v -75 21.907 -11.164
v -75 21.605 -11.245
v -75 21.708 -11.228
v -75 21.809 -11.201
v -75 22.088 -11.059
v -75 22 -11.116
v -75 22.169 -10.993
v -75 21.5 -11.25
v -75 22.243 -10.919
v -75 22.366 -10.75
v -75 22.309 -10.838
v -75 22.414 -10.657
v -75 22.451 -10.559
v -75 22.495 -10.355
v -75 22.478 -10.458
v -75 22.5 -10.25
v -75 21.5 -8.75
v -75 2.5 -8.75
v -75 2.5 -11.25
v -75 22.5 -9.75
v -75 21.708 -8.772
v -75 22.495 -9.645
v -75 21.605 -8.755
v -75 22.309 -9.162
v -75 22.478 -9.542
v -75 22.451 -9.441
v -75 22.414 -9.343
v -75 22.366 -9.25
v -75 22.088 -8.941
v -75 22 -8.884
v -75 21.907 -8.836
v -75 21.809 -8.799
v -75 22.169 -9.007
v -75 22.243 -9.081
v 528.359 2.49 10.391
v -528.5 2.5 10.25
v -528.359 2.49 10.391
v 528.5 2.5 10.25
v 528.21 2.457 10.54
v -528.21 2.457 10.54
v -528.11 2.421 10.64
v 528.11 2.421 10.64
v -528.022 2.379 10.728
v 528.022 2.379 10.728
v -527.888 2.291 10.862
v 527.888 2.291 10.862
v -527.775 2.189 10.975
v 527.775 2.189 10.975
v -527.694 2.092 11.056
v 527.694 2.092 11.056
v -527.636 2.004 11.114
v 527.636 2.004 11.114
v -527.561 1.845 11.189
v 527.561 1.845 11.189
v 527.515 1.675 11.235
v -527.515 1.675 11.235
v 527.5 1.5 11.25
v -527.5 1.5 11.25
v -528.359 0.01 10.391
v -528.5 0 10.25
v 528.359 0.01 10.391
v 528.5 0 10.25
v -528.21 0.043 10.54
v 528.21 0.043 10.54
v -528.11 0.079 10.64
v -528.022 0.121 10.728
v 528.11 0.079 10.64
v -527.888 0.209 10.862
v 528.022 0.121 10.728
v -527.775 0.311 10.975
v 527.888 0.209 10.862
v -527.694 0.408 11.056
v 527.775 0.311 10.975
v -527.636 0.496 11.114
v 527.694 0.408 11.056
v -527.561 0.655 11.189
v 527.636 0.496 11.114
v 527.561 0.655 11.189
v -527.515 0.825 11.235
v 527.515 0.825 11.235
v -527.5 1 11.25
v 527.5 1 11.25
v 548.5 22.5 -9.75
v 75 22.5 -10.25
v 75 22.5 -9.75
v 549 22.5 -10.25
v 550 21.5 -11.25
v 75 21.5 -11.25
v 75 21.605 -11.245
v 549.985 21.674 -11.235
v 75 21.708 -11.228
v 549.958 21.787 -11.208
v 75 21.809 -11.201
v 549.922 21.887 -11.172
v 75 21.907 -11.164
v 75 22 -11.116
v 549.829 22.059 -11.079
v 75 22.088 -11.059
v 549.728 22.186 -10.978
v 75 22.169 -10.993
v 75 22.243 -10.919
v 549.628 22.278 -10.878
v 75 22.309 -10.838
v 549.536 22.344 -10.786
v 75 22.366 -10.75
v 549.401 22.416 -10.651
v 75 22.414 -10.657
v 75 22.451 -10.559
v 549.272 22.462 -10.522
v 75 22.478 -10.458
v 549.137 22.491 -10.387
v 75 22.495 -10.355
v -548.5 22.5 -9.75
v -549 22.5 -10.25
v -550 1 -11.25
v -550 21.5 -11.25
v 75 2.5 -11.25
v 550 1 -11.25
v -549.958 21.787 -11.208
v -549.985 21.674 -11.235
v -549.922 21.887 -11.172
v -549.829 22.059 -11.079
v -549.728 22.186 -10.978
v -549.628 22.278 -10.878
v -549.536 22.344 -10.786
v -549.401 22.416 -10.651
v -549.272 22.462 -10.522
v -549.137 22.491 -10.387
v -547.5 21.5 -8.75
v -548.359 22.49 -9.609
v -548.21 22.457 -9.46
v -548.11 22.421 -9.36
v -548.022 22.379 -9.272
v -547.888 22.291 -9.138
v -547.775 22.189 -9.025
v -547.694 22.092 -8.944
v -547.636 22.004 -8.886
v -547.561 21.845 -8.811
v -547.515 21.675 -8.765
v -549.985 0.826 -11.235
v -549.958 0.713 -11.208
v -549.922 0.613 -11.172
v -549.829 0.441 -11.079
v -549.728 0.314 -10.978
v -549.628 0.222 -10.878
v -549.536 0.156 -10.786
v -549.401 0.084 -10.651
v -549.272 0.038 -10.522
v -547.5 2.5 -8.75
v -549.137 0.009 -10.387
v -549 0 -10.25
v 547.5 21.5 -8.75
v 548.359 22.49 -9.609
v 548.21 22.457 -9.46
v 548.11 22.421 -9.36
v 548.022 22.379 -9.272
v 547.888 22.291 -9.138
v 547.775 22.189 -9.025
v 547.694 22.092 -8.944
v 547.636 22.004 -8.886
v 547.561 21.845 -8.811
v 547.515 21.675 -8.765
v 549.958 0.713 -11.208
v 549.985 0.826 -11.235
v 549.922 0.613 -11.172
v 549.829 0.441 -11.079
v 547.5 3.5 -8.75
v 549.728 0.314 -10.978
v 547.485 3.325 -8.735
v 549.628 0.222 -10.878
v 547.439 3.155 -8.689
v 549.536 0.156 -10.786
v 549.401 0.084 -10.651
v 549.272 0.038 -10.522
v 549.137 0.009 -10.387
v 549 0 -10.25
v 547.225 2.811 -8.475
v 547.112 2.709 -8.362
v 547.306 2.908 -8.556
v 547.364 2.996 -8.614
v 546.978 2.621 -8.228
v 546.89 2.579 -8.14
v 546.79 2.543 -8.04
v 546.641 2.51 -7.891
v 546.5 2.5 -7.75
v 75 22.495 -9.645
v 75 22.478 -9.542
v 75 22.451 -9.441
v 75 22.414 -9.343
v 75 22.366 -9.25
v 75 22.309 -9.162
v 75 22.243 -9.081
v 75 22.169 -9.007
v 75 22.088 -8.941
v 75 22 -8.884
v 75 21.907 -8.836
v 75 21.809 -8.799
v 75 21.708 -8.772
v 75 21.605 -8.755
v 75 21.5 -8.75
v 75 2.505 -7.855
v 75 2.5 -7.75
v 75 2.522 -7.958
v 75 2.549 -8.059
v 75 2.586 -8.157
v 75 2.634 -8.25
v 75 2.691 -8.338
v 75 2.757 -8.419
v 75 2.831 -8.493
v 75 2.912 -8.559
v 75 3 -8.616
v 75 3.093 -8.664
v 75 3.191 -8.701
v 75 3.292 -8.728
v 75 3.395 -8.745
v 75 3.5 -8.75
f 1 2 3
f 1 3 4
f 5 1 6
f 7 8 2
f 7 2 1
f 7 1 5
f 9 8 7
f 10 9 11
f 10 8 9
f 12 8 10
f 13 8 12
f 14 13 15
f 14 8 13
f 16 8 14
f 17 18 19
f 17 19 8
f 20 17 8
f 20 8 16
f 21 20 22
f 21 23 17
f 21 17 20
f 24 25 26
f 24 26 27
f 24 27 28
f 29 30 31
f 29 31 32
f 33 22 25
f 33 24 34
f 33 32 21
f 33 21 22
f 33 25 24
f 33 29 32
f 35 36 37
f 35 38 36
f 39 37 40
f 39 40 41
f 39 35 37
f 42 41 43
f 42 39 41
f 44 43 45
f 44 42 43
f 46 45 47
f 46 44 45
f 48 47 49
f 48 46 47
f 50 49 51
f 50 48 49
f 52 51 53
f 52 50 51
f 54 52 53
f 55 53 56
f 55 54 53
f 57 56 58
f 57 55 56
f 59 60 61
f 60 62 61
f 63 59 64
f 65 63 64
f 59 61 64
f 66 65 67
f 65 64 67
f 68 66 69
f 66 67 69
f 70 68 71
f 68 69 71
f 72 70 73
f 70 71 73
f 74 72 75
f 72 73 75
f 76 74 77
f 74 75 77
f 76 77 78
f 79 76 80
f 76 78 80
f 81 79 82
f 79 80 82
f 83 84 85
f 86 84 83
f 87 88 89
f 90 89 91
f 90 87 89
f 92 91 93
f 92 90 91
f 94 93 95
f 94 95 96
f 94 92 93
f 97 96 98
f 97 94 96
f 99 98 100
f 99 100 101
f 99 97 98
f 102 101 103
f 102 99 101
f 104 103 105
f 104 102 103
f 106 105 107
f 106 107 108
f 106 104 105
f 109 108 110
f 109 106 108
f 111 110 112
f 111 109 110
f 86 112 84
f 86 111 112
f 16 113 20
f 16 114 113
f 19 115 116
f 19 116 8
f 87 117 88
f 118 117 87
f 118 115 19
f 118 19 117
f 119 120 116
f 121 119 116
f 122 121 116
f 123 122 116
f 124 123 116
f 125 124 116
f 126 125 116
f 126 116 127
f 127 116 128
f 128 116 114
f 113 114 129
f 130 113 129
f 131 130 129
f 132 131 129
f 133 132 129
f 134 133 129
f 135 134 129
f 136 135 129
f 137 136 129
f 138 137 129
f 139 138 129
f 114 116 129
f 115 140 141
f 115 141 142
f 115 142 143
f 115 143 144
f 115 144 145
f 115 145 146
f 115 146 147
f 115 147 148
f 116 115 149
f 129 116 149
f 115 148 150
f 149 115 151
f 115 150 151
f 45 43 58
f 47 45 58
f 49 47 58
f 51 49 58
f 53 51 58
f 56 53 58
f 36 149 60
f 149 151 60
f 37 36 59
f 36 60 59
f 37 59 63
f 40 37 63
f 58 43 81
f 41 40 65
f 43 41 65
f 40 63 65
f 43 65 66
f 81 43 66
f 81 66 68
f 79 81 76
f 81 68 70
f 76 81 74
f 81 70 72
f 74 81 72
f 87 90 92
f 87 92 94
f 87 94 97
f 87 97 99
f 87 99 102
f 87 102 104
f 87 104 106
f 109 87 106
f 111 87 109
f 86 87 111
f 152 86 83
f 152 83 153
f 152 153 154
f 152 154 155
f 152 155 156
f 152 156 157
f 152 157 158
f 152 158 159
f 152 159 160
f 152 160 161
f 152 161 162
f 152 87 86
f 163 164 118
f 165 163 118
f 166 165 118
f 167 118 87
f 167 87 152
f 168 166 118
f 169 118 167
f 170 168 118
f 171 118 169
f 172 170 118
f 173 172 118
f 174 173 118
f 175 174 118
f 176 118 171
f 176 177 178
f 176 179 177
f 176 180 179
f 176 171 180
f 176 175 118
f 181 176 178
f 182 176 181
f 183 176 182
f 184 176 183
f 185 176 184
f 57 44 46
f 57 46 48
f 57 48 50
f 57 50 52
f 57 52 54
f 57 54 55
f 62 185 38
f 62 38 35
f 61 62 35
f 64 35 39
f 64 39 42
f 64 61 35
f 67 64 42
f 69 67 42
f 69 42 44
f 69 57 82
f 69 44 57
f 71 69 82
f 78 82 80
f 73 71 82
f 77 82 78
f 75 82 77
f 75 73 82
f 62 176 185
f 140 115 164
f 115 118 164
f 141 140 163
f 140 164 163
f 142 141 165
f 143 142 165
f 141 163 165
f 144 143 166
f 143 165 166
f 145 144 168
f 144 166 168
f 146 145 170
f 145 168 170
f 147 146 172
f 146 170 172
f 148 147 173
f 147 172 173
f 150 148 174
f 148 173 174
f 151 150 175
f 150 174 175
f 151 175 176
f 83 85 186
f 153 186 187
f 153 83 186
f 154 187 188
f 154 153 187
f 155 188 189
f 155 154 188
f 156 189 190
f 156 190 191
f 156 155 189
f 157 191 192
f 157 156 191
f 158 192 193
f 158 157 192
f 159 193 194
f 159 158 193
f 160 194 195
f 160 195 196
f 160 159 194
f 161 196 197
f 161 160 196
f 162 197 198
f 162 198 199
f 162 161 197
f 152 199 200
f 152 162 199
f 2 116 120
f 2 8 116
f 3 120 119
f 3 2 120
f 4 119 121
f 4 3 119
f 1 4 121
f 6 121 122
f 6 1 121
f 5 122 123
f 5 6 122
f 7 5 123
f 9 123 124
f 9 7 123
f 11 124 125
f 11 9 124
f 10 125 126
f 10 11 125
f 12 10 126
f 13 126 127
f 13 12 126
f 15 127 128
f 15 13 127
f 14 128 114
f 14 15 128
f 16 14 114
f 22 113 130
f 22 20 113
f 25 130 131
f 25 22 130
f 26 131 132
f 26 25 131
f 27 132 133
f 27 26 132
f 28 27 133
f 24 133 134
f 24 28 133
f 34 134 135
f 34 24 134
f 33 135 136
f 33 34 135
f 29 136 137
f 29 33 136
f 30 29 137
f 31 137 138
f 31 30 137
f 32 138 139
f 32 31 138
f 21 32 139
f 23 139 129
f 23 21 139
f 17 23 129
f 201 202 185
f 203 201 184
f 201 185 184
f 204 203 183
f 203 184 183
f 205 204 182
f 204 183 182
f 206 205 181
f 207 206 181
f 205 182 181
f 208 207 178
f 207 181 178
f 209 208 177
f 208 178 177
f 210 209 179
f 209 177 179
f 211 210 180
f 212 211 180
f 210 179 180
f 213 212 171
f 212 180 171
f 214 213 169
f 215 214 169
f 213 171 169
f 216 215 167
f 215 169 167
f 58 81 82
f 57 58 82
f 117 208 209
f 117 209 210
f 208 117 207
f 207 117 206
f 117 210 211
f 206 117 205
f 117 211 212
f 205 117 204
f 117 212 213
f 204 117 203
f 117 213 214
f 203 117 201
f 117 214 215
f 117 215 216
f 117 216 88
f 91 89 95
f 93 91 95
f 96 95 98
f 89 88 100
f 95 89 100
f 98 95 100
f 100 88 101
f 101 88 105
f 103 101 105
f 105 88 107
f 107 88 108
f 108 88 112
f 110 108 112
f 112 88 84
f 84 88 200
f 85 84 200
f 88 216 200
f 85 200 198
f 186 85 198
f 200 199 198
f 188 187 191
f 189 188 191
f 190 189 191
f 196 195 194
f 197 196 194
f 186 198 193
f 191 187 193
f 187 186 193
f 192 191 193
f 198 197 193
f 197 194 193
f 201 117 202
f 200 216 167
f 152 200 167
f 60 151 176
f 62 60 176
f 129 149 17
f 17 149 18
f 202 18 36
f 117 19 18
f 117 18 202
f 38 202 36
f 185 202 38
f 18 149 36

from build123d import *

# Parameters (mm, degrees)
SKETCH1_W           = 1100
SKETCH1_H           = 22.5
BOSS_EXTRUDE1_DEPTH = 2.5
SKETCH2_W           = 1100
SKETCH2_H           = 2.5
BOSS_EXTRUDE2_DEPTH = 20
SKETCH3_W           = 150
SKETCH3_H           = 20
CUT_EXTRUDE1_DEPTH  = 10
CUT_EXTRUDE2_DEPTH  = 551.57498354
FILLET1_R           = 1


with BuildPart() as part:
    # Sketch1 → Boss-Extrude1 (new body)
    with BuildSketch(Plane(origin=(0, 0, 0), x_dir=(1, 0, 0), z_dir=(0, 1, 0))):
        Rectangle(SKETCH1_W, SKETCH1_H)
    extrude(amount=BOSS_EXTRUDE1_DEPTH)

    # Sketch2 → Boss-Extrude2 (add)
    with BuildSketch(Plane(origin=(0, 2.5, 0), x_dir=(1, 0, 0), z_dir=(0, 1, 0))):
        with Locations((0, 10)):
            Rectangle(SKETCH2_W, SKETCH2_H)
    extrude(amount=BOSS_EXTRUDE2_DEPTH)

    # Sketch3 → Cut-Extrude1 (cut)
    with BuildSketch(Plane.XY.offset(-8.75)):
        with Locations((0, 12.5)):
            Rectangle(SKETCH3_W, SKETCH3_H)
    extrude(amount=-CUT_EXTRUDE1_DEPTH, mode=Mode.SUBTRACT)

    # Sketch4 → Cut-Extrude2 (cut, through all)
    with BuildSketch(Plane(origin=(0, 0, 0), x_dir=(-1, 0, 0), z_dir=(0, -1, 0))):
        Polygon((-550, 11.25), (-527.5, -11.25), (-550, -11.25), align=None)
        Polygon((550, -11.25), (550, 11.25), (527.5, -11.25), align=None)
    extrude(amount=-CUT_EXTRUDE2_DEPTH, mode=Mode.SUBTRACT)

    # Fillet1
    fillet1_edges = [part.edges().sort_by_distance(p)[0] for p in [
        (312.5, 22.5, -11.25),
        (311.25, 22.5, -8.75),
        (-312.5, 22.5, -11.25),
        (311.25, 2.5, -8.75),
        (0, 0, -11.25),
        (0, 0, 11.25),
        (0, 2.5, 11.25),
        (-311.25, 22.5, -8.75),
    ]]
    fillet(fillet1_edges, radius=FILLET1_R)


solid = part.part
